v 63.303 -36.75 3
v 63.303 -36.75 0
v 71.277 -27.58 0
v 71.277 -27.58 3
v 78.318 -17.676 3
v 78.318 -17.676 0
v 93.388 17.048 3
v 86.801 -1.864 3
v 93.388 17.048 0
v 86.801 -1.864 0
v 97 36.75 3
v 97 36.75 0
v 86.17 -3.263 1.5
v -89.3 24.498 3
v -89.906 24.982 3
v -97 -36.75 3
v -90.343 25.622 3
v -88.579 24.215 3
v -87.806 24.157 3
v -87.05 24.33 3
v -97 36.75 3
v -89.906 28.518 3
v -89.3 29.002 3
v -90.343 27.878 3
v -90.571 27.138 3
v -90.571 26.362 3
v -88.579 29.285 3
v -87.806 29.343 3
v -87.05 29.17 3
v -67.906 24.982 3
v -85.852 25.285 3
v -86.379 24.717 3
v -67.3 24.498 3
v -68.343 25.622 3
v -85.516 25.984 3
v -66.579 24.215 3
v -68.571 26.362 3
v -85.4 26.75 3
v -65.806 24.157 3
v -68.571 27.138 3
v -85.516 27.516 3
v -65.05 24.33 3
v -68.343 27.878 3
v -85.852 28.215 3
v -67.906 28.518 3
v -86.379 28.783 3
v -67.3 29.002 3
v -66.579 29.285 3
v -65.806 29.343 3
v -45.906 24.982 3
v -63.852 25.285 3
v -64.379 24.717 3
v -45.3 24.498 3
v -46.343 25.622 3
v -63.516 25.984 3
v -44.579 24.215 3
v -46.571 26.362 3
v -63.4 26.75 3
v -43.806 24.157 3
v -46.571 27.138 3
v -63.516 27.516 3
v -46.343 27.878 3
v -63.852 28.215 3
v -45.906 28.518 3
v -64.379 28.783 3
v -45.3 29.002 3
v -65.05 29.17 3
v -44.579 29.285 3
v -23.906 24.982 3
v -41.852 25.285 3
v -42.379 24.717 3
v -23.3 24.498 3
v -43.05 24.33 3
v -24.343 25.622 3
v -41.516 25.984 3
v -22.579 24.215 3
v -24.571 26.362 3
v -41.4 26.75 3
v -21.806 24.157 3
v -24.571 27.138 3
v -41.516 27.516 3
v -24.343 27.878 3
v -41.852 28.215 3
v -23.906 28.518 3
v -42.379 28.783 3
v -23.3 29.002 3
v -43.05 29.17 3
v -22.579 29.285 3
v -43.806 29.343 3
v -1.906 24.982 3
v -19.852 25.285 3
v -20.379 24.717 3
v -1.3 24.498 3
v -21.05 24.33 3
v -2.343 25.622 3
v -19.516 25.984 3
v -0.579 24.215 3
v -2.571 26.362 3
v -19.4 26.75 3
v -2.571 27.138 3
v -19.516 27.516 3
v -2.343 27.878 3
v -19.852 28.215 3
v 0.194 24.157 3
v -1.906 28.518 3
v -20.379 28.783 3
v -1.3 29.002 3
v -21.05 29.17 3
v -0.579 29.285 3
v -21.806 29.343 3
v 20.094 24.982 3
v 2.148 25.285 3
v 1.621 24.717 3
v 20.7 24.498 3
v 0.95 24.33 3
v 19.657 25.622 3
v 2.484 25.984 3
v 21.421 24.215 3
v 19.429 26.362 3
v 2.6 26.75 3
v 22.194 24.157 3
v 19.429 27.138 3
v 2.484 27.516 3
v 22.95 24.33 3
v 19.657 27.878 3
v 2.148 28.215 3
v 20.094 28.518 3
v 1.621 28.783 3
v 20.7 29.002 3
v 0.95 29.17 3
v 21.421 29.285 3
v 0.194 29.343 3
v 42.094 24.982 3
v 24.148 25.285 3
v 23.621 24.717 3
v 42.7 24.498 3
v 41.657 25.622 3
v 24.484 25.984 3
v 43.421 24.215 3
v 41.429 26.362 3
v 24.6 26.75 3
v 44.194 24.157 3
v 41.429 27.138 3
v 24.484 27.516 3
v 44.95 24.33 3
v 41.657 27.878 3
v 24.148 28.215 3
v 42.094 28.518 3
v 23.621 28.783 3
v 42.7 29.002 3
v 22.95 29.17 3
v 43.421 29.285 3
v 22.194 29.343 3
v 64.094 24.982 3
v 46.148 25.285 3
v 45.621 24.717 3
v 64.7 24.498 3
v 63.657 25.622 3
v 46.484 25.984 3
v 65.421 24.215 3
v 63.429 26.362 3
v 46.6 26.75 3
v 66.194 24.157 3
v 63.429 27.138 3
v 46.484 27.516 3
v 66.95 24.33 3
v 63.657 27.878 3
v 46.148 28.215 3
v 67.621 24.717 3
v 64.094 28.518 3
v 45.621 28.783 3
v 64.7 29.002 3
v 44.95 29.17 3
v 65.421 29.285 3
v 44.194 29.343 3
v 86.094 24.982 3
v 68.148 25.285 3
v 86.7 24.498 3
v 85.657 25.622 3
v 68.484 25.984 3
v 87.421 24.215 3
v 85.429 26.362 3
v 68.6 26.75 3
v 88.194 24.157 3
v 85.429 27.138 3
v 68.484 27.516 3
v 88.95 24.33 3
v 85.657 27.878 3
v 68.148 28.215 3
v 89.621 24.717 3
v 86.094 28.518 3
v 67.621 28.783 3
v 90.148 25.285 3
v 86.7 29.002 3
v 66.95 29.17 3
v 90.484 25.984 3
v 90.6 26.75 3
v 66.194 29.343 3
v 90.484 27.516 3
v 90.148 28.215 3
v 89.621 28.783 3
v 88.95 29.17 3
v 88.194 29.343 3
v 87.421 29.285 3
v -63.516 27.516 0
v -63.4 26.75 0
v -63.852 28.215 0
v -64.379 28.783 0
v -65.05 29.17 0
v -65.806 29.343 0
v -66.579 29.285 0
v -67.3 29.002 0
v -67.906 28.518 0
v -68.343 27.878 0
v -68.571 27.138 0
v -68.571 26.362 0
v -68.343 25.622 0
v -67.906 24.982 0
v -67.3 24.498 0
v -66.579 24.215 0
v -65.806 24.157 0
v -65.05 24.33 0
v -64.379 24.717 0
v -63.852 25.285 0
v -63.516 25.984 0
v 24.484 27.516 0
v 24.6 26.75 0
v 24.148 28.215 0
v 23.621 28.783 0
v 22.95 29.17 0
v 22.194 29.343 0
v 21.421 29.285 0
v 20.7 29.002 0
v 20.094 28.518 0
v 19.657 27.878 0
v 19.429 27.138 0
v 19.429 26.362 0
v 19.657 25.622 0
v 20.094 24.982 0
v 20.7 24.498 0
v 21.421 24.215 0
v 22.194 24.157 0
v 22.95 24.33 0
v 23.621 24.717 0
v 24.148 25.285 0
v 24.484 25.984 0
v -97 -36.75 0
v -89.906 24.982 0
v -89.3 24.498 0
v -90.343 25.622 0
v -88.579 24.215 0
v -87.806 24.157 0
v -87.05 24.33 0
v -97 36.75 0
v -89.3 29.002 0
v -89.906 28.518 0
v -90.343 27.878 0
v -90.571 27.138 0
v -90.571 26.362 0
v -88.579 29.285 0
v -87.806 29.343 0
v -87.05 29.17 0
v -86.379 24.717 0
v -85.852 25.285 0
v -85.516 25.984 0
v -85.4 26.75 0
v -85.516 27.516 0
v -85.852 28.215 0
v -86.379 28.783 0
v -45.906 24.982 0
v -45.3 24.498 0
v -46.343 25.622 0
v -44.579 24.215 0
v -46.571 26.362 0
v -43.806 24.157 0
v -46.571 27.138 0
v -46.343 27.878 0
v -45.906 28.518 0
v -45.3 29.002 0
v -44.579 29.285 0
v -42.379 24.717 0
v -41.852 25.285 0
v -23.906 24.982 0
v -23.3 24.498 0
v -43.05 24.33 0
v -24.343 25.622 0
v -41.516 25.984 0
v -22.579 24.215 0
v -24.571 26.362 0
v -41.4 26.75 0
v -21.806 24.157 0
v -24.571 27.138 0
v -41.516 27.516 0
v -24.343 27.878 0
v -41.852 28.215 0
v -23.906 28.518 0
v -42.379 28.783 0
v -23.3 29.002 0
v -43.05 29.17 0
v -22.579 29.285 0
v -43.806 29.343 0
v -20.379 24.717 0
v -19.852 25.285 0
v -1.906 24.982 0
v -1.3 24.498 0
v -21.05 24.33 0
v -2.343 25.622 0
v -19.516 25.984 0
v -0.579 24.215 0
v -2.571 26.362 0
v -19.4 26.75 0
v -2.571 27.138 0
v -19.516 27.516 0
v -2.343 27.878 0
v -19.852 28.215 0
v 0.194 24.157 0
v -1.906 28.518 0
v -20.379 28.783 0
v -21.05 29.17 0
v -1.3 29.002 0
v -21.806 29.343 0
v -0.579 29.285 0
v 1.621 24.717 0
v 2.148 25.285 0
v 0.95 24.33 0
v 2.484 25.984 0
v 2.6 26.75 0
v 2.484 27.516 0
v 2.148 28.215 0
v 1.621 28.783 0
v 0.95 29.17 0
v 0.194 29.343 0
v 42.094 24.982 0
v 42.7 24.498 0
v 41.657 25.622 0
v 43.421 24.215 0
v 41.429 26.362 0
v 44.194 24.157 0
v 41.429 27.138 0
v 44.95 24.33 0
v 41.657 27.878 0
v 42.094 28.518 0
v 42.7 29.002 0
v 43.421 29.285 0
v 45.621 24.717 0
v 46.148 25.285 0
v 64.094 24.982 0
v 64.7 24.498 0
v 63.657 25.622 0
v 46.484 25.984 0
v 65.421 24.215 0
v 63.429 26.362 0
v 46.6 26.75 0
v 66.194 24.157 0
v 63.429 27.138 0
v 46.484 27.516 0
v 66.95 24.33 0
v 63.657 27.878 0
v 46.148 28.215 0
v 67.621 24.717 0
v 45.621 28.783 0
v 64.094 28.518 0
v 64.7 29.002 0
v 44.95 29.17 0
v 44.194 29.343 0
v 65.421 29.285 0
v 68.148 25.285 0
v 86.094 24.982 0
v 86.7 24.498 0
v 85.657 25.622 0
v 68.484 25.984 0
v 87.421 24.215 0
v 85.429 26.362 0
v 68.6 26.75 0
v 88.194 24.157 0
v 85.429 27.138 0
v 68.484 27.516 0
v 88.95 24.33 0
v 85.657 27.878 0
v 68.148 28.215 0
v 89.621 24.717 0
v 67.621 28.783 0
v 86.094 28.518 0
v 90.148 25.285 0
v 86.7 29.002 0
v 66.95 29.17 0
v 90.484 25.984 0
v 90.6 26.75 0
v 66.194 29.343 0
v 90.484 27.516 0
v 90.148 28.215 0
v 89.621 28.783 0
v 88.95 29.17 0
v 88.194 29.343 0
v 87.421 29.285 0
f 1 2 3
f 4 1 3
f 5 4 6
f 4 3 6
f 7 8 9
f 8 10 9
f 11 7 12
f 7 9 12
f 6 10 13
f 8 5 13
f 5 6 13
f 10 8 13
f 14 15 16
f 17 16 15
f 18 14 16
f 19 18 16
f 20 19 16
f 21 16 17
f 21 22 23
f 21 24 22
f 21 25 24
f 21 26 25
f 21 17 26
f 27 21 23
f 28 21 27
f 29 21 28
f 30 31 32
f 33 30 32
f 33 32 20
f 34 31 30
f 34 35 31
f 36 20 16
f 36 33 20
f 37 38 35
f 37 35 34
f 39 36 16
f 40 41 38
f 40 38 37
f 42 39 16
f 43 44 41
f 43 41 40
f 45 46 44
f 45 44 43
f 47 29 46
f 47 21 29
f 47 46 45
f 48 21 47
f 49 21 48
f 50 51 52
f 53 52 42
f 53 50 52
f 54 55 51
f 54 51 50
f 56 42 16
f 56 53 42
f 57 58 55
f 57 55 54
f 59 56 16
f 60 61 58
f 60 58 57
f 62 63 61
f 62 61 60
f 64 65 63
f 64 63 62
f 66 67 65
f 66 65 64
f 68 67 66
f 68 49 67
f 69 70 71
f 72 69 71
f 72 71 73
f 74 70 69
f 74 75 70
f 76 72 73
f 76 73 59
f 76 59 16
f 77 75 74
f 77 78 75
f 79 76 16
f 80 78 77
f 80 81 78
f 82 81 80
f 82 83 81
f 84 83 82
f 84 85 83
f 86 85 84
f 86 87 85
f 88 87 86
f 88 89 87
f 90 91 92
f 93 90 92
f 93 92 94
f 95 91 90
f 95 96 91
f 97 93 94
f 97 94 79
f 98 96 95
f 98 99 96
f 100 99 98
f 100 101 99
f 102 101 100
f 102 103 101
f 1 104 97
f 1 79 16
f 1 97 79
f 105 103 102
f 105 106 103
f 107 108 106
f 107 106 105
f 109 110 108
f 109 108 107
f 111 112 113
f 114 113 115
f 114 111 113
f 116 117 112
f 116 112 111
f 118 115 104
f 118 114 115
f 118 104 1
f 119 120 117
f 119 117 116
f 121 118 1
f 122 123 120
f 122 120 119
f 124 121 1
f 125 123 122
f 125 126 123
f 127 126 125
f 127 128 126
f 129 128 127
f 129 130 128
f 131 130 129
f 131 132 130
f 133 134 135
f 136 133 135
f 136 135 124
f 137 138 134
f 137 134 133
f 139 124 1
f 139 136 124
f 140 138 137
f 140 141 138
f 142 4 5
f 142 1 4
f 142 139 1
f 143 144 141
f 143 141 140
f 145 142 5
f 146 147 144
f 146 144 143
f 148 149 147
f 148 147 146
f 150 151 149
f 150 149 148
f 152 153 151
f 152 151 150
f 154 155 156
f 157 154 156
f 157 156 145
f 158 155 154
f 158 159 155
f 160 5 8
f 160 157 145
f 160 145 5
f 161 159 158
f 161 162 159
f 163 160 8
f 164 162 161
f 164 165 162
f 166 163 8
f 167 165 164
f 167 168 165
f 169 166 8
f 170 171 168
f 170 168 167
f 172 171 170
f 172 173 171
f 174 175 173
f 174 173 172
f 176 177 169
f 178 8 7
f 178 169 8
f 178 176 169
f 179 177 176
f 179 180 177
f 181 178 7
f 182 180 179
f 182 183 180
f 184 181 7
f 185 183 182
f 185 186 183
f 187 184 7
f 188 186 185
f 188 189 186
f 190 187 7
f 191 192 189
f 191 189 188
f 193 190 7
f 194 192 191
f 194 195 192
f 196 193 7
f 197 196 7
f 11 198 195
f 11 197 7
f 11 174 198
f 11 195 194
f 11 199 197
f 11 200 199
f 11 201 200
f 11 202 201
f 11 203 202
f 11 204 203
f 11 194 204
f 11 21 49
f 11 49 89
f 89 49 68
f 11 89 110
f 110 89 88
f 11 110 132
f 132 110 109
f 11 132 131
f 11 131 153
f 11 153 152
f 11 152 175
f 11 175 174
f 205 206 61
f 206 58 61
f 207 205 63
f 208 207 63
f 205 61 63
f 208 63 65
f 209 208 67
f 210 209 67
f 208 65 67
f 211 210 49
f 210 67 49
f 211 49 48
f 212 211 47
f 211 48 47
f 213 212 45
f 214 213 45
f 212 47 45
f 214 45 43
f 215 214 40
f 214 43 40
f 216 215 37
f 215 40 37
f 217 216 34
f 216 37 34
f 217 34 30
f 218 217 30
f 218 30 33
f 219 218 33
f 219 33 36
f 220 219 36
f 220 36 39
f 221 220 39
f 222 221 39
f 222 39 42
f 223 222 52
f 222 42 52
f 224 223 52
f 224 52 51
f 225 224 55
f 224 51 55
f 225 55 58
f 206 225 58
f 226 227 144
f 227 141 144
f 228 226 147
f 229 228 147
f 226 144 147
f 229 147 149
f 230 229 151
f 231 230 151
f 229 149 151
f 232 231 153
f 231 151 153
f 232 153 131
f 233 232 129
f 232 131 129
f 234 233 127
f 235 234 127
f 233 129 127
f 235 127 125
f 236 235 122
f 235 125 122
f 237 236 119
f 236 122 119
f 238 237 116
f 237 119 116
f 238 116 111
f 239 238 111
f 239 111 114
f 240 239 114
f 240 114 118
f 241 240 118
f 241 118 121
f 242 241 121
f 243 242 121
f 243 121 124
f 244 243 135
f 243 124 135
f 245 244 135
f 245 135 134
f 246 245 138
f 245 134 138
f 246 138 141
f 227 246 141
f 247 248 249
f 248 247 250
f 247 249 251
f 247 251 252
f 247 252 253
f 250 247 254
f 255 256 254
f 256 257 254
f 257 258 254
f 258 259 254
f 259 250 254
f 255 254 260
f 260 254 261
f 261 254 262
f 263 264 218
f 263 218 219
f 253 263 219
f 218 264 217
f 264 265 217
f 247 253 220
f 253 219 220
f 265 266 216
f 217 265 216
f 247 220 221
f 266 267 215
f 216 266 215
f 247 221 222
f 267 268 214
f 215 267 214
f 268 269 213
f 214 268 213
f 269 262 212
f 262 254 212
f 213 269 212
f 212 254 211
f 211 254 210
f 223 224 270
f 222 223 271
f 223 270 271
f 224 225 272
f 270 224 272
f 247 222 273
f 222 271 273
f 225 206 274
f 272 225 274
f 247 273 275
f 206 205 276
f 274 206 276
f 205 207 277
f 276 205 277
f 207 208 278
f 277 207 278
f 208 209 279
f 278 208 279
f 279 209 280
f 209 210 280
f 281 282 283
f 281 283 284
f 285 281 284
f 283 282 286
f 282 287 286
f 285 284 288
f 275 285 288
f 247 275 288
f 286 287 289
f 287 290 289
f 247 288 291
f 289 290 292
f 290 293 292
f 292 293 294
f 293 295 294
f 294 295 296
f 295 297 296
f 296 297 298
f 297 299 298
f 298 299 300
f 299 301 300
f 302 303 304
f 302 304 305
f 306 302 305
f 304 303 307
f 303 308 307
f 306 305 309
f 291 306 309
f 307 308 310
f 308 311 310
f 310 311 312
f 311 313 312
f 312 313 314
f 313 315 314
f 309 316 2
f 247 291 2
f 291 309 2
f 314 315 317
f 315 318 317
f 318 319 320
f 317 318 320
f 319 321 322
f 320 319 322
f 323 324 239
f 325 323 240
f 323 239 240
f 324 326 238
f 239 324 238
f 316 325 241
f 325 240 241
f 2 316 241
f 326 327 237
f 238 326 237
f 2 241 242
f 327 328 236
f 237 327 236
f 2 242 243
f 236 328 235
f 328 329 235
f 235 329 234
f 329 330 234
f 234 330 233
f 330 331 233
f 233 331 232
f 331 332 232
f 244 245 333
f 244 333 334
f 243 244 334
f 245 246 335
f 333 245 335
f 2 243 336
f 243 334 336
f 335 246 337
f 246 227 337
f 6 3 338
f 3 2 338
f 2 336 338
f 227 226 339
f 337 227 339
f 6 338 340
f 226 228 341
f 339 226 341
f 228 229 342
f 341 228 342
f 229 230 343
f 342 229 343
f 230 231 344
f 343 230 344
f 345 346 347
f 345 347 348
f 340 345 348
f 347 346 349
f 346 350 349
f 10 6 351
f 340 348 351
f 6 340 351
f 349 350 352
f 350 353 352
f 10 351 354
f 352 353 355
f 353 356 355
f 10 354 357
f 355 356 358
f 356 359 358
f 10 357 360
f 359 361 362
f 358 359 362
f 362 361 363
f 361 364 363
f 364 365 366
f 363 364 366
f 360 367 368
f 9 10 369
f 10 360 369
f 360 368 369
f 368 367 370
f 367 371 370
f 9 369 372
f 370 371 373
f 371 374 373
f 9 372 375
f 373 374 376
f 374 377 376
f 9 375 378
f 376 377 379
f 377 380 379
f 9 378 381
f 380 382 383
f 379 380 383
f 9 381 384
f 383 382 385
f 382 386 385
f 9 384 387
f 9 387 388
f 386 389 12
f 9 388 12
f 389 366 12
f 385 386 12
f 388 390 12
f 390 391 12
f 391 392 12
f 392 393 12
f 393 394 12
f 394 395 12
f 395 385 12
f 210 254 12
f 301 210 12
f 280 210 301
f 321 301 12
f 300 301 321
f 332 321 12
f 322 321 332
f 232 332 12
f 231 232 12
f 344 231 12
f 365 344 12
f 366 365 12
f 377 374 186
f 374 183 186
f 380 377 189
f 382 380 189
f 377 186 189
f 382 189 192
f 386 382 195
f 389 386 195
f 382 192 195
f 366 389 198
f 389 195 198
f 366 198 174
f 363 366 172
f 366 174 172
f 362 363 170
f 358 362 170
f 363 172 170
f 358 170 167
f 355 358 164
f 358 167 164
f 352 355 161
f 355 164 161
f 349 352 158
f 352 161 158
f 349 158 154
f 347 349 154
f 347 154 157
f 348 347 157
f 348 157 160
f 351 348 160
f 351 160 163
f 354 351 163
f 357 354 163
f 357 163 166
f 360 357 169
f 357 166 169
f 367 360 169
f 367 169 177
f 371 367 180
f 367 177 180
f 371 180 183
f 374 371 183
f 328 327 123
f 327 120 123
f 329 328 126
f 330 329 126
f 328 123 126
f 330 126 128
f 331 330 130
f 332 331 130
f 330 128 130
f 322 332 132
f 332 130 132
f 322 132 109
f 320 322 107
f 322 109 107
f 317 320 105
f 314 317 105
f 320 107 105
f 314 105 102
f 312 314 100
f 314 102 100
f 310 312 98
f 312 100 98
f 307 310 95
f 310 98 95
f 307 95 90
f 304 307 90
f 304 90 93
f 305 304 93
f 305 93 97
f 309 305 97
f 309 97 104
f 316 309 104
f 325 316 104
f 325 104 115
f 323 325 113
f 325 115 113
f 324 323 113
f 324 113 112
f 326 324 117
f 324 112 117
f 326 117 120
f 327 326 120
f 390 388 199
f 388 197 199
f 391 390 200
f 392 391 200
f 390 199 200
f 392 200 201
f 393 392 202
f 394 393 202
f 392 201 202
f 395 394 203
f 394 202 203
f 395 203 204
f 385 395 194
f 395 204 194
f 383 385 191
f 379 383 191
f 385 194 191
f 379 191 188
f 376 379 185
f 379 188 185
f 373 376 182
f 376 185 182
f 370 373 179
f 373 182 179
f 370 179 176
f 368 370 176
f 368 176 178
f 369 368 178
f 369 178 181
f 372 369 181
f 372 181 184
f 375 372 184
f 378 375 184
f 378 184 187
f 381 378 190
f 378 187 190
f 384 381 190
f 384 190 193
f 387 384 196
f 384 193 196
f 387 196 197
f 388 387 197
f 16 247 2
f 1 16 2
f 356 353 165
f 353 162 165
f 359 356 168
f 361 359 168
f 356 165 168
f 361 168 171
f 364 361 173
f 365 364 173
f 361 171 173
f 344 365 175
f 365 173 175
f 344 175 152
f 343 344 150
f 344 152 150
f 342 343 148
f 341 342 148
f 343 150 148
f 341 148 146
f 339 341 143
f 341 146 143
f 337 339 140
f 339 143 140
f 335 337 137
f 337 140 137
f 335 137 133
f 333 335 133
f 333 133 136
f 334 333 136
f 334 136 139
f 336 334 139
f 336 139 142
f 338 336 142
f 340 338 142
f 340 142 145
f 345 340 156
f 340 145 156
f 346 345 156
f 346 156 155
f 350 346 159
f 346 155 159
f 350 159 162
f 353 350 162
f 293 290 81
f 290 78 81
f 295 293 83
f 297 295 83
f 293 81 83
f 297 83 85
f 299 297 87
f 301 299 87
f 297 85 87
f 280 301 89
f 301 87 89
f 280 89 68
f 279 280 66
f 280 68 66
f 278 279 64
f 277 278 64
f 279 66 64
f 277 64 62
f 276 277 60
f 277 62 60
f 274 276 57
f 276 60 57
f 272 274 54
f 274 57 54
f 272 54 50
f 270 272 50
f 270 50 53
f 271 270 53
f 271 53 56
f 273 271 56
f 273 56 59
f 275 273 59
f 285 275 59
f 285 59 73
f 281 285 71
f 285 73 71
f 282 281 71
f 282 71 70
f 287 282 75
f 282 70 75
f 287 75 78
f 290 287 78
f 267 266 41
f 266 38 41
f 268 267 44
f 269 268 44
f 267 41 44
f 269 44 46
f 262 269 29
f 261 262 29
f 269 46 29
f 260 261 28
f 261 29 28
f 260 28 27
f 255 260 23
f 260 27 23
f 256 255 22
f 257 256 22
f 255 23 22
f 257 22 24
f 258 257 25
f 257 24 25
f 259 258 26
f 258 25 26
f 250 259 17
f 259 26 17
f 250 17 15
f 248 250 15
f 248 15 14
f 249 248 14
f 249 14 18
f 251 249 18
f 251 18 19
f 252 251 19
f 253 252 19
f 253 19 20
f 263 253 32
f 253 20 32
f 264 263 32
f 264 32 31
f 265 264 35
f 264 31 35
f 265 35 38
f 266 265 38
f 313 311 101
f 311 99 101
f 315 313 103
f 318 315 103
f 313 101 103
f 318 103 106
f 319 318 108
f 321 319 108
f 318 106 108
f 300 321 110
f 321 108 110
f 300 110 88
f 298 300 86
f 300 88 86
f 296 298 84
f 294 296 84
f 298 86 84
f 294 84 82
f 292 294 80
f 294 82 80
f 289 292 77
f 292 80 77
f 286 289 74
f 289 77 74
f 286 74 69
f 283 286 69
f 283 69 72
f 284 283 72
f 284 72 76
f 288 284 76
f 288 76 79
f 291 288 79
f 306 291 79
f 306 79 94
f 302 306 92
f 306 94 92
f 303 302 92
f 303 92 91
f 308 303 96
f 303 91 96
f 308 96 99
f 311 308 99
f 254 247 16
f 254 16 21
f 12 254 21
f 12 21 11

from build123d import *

# Parameters (mm, degrees)
SKETCH_1_W                 = 200
SKETCH_1_H                 = 73.5
EXTRUDE_1_DEPTH            = 3
SKETCH_2_R                 = 2.6
CUT_EXTRUDE_2_DEPTH        = 107.581248351
PATTERN_LINEAR_1_COUNT     = 5
PATTERN_LINEAR_1_PITCH     = 22
PATTERN_LINEAR_1_COL_COUNT = 5
PATTERN_LINEAR_1_COL_PITCH = 22
CUT_EXTRUDE_3_DEPTH        = 107.581248351
CUT_EXTRUDE_3_DEPTH_BACK   = 107.581248351
SKETCH_3_W                 = 3
SKETCH_3_H                 = 73.5
CUT_EXTRUDE_4_DEPTH        = 104.771684481
CUT_EXTRUDE_4_DEPTH_BACK   = 104.771684481


with BuildPart() as part:
    # 草图1 → 凸台-拉伸1 (new body)
    with BuildSketch(Plane.XY):
        Rectangle(SKETCH_1_W, SKETCH_1_H)
    extrude(amount=EXTRUDE_1_DEPTH)

    # 草图2 → 切除-拉伸2 (cut, symmetric)
    with BuildSketch(Plane.XY.offset(3)):
        with Locations((0, 26.75)):
            Circle(SKETCH_2_R)
    cut_extrude_2 = extrude(amount=CUT_EXTRUDE_2_DEPTH, both=True, mode=Mode.SUBTRACT)

    # 阵列(线性)1: 切除-拉伸2 ×5
    with Locations(*[(i * PATTERN_LINEAR_1_PITCH, 0, 0) for i in range(1, PATTERN_LINEAR_1_COUNT)]):
        add(cut_extrude_2, mode=Mode.SUBTRACT)

    # 阵列(线性)1 col: 切除-拉伸2 ×5
    with Locations(*[(-i * PATTERN_LINEAR_1_COL_PITCH, 0, 0) for i in range(1, PATTERN_LINEAR_1_COL_COUNT)]):
        add(cut_extrude_2, mode=Mode.SUBTRACT)

    # 草图3 → 切除-拉伸3 (cut, two sides: drawn at the far end of the back side and taken through both)
    with BuildSketch(Plane.XY.offset(3).offset(-CUT_EXTRUDE_3_DEPTH_BACK)):
        with Locations((-98.5, 0)):
            Rectangle(SKETCH_3_W, SKETCH_3_H)
        with Locations((98.5, 0)):
            Rectangle(SKETCH_3_W, SKETCH_3_H)
    extrude(amount=CUT_EXTRUDE_3_DEPTH + CUT_EXTRUDE_3_DEPTH_BACK, mode=Mode.SUBTRACT)

    # 草图4 → 切除-拉伸4 (cut, two sides: drawn at the far end of the back side and taken through both)
    with BuildSketch(Plane.XY.offset(3).offset(-CUT_EXTRUDE_4_DEPTH_BACK)):
        with BuildLine():
            Line((63.303207355, -36.75), (97, -36.75))
            Line((97, -36.75), (97, 36.75))
            add(Edge.make_bspline(
                [(63.303207355, -36.75), (92.189094157, -6.525878678), (97, 36.75)],
                knots=[0, 0, 0, 1, 1, 1], degree=2))
        make_face()
    extrude(amount=CUT_EXTRUDE_4_DEPTH + CUT_EXTRUDE_4_DEPTH_BACK, mode=Mode.SUBTRACT)


solid = part.part
